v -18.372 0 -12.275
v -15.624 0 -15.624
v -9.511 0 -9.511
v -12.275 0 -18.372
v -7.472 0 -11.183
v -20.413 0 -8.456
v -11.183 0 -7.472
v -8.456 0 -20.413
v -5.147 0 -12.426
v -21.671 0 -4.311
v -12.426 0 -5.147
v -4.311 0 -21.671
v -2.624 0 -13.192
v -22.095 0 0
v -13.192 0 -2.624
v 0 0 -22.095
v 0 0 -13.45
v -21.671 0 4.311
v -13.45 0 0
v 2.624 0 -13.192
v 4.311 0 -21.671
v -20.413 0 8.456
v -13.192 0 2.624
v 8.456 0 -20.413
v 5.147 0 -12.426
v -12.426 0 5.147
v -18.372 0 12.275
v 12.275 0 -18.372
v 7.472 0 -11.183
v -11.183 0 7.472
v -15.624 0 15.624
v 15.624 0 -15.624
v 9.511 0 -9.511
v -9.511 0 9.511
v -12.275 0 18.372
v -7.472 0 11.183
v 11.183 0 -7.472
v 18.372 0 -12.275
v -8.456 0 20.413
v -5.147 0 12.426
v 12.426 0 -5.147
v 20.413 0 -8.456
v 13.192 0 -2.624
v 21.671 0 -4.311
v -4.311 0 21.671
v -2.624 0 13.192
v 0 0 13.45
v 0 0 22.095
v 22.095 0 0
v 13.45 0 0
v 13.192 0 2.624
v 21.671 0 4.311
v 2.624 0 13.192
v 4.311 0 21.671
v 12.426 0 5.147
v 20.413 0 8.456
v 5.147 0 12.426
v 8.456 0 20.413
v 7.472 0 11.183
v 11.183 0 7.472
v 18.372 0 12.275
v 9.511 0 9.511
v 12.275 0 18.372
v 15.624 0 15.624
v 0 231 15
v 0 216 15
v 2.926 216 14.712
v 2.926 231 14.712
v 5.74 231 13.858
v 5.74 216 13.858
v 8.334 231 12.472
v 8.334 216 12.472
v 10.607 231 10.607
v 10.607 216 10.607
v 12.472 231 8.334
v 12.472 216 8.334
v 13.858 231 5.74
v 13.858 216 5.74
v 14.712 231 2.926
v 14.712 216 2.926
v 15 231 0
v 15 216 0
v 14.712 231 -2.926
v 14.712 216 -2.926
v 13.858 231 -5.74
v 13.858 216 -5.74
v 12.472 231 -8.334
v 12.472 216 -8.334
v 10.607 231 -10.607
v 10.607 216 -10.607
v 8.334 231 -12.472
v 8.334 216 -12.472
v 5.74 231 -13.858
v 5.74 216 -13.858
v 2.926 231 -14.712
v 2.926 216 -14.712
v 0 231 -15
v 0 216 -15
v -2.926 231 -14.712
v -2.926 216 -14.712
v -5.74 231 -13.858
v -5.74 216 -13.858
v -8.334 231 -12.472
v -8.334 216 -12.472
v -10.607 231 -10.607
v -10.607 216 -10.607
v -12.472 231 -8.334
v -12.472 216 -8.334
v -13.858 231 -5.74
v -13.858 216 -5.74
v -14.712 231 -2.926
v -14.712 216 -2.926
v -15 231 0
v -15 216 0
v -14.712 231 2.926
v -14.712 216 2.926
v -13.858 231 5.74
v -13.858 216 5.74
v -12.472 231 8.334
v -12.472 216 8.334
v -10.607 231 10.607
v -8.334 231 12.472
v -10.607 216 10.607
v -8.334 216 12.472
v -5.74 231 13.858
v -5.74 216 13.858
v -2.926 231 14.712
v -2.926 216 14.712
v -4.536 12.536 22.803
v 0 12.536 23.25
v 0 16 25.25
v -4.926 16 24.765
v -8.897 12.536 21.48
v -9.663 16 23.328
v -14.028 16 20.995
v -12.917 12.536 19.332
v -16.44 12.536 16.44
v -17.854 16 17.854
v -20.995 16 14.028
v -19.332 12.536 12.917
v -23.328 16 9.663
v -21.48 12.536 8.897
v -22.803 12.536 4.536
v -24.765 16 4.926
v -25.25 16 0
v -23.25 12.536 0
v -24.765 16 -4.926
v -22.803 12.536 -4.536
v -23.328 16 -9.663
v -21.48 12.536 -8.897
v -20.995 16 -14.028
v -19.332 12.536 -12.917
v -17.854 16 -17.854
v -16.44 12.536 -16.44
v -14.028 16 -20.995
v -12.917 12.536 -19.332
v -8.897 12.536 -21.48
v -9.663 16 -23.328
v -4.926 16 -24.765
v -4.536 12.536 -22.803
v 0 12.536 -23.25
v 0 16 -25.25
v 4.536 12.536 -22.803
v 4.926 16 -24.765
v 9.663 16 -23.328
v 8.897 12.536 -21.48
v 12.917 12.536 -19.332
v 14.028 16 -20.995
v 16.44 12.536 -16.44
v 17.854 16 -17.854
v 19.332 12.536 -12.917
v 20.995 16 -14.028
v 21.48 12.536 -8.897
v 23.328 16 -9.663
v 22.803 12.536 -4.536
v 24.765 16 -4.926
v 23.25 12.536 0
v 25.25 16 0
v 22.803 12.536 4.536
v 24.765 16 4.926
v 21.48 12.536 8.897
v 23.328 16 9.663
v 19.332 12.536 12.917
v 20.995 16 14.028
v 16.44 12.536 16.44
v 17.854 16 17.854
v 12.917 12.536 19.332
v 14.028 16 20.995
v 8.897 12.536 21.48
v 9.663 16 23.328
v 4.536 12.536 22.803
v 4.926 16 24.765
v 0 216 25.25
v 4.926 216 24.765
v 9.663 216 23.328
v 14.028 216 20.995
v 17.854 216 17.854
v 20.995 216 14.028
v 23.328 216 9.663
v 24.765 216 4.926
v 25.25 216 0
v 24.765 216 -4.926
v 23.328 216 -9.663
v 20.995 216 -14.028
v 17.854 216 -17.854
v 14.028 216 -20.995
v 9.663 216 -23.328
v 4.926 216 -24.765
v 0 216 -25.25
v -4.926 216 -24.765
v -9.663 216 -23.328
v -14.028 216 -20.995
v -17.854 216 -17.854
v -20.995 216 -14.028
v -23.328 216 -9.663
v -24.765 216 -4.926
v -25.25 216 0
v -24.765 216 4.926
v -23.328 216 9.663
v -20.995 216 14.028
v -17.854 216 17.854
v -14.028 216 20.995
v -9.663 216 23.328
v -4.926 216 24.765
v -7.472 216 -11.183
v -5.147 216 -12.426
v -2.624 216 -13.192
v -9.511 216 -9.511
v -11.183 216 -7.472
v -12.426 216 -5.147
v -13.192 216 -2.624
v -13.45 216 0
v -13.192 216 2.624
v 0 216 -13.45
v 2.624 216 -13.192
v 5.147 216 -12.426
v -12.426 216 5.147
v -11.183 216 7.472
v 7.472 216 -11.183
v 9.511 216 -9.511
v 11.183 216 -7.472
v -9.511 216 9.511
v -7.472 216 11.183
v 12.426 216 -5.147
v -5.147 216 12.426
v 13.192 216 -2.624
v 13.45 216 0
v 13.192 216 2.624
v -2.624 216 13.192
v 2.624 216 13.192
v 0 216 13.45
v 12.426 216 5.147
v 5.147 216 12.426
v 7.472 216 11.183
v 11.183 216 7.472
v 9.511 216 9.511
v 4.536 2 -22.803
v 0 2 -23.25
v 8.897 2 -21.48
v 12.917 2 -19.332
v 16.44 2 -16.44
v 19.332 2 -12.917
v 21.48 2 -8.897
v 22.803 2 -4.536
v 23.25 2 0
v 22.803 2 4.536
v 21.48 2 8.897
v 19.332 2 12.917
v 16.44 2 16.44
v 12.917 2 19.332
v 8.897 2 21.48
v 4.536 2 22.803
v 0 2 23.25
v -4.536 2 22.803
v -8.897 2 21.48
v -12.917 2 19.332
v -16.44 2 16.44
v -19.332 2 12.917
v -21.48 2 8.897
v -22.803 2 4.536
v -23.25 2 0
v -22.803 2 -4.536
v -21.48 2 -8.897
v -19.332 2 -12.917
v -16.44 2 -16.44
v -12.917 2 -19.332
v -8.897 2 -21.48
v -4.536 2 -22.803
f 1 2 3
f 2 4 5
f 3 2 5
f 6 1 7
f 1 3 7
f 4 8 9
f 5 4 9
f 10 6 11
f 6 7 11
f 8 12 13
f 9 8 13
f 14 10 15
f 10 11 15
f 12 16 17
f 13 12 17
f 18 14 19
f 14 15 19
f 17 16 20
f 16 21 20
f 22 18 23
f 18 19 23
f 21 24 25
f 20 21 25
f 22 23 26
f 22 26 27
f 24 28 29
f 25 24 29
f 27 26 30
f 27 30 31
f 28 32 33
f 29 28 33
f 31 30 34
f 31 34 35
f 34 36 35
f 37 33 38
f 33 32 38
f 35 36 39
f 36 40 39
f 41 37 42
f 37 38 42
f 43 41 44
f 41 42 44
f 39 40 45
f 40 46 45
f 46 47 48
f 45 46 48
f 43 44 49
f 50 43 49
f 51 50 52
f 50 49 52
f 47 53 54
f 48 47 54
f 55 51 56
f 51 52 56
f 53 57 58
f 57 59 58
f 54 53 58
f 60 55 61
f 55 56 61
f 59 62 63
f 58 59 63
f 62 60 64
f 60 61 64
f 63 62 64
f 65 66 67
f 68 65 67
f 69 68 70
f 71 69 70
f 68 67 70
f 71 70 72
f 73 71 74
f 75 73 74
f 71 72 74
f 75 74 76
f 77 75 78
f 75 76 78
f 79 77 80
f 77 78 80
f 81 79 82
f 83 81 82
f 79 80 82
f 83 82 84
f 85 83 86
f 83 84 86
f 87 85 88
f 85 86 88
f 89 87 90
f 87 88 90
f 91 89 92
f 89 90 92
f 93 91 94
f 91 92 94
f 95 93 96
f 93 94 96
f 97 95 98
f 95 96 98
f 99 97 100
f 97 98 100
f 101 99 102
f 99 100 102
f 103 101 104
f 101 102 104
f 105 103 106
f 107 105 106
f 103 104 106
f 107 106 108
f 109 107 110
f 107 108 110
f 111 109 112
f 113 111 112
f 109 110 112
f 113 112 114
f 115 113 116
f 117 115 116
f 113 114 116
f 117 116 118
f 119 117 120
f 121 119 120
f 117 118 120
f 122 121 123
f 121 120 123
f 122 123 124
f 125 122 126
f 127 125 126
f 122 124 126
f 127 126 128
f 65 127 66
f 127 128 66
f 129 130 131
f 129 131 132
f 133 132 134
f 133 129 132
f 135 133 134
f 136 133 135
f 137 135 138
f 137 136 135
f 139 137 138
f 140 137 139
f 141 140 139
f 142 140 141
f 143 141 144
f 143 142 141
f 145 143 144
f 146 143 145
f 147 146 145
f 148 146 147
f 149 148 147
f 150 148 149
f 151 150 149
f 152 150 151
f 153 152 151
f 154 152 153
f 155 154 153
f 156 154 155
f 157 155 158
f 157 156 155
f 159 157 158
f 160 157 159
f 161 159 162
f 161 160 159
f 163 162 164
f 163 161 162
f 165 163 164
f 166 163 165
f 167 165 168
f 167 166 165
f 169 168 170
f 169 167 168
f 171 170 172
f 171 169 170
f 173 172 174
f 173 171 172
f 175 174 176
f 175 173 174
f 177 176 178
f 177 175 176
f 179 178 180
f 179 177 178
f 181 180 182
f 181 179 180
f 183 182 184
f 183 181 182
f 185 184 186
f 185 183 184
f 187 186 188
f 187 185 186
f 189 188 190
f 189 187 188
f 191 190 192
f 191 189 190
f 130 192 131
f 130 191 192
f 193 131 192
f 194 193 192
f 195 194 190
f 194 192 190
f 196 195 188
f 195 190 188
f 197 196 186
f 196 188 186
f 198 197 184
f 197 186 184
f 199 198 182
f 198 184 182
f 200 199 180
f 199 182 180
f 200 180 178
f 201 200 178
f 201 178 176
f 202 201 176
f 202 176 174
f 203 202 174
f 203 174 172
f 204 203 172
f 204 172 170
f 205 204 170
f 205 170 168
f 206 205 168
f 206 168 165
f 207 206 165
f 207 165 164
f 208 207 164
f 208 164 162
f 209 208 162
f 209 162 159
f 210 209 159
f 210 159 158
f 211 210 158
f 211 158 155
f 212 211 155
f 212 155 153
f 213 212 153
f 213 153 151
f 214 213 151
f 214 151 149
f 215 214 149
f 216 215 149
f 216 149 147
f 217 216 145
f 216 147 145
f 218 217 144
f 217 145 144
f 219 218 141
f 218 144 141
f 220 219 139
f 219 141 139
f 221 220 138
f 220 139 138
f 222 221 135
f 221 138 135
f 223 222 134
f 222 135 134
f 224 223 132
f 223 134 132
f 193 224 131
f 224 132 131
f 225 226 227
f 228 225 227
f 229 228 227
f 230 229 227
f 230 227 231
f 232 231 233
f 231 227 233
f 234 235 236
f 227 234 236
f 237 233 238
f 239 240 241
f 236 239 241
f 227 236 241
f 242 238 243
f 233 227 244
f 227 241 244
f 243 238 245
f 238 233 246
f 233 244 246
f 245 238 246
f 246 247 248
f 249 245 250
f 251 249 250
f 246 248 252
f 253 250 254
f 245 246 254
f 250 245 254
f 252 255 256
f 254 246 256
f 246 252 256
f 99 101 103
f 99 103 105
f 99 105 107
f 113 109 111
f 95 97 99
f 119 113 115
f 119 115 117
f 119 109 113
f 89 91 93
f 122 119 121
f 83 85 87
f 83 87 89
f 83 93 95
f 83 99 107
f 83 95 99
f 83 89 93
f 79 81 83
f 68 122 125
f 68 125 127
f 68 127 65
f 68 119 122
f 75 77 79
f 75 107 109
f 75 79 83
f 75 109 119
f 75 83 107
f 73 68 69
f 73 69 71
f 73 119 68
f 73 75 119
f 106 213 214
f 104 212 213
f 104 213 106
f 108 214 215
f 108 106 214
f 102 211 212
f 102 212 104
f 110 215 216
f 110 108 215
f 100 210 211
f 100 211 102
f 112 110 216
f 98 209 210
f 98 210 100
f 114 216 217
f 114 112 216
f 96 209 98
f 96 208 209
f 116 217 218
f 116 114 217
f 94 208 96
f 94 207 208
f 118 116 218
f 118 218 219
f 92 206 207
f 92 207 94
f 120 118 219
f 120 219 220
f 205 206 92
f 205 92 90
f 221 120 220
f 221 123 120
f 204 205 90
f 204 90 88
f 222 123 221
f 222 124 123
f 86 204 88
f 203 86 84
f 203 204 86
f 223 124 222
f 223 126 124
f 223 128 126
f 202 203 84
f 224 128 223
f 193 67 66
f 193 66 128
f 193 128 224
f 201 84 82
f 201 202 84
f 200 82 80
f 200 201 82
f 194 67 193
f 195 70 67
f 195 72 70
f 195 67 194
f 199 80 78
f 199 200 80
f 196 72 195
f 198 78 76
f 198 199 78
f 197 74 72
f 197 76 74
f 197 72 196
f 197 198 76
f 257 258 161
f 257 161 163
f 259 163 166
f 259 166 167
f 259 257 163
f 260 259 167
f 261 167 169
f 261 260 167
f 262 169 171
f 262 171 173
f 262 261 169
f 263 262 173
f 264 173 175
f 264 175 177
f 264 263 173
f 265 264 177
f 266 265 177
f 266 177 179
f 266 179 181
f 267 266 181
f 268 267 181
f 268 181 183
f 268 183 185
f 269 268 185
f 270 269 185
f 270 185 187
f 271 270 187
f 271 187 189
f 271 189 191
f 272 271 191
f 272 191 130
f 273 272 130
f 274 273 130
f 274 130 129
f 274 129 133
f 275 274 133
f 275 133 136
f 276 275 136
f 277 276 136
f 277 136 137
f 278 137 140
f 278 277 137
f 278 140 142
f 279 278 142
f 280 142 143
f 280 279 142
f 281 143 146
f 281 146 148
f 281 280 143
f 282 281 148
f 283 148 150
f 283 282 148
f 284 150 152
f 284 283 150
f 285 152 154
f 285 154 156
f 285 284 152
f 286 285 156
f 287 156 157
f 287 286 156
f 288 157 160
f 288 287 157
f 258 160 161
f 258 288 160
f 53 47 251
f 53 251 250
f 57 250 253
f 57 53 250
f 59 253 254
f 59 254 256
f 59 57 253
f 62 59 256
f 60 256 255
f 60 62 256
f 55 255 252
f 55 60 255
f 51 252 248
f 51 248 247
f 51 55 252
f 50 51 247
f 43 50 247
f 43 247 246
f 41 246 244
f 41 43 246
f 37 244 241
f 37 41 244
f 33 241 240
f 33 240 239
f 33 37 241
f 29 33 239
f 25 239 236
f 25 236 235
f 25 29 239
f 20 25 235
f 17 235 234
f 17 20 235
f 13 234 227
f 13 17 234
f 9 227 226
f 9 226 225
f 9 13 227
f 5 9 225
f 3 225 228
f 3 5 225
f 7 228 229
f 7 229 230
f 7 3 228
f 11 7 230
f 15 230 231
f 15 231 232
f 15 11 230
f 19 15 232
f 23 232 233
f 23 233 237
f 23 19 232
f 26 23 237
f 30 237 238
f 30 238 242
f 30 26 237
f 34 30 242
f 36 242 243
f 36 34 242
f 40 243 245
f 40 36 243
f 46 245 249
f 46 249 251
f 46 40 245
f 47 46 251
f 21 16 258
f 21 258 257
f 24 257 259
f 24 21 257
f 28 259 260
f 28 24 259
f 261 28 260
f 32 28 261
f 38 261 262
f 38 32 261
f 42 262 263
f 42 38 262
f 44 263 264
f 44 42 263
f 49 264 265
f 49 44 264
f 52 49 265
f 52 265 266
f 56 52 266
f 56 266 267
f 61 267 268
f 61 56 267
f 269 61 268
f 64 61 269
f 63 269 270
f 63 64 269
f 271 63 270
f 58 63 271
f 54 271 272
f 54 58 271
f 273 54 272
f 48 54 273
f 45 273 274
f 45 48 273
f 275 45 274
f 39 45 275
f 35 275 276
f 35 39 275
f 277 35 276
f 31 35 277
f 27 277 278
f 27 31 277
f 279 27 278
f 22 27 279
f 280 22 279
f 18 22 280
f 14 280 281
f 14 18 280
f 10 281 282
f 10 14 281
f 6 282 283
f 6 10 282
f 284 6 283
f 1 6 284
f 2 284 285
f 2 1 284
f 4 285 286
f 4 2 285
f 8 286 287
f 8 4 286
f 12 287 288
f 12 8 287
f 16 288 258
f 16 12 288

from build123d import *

# Parameters (mm, degrees)
SKETCH1_R           = 25.25
SKETCH1_R_2         = 13.45
BOSS_EXTRUDE1_DEPTH = 216
SKETCH2_OUTSIDE_W   = 98
SKETCH2_OUTSIDE_H   = 98
SKETCH2_OUTSIDE_R   = 23.25
CUT_EXTRUDE1_DEPTH  = 12
CHAMFER2_SIZE       = 4
CHAMFER2_SIZE_2     = 2.309401077
CHAMFER3_SIZE       = 2
CHAMFER3_SIZE2      = 1.154700538
SKETCH3_R           = 15
INSIDE_HEAD_DEPTH   = 15


with BuildPart() as part:
    # Sketch1 → Boss-Extrude1 (new body)
    with BuildSketch(Plane(origin=(0, 0, 0), x_dir=(1, 0, 0), z_dir=(0, 1, 0))):
        with Locations(Location((0, 0, 0), (0, 0, 270))):
            Circle(SKETCH1_R)
        with Locations(Location((0, 0, 0), (0, 0, 270))):
            Circle(SKETCH1_R_2, mode=Mode.SUBTRACT)
    extrude(amount=BOSS_EXTRUDE1_DEPTH)

    # Sketch2 outside → Cut-Extrude1 (cut)
    with BuildSketch(Plane.XZ):
        Rectangle(SKETCH2_OUTSIDE_W, SKETCH2_OUTSIDE_H)
        with Locations(Location((0, 0, 0), (0, 0, 270))):
            Circle(SKETCH2_OUTSIDE_R, mode=Mode.SUBTRACT)
    extrude(amount=-CUT_EXTRUDE1_DEPTH, mode=Mode.SUBTRACT)

    # Chamfer2
    # the kernel refuses this chamfer: 4, 2.309401077 mm, written as the material it takes off along each edge
    with BuildSketch(Plane(origin=(0, 12, 0), x_dir=(0, 0, 1), z_dir=(1, 0, 0))) as chamfer2_piece_1_section:
        Polygon((25.25, -CHAMFER2_SIZE), (25.25 - CHAMFER2_SIZE_2, 0), (25.25, 0), align=None)
    chamfer2_piece_1 = revolve(axis=Axis((0, 12, 0), (0, -1, 0)), mode=Mode.PRIVATE)
    chamfer2_piece_1 = chamfer2_piece_1 - Plane(origin=(0, 14.291094123, 0), x_dir=(0, 0, -1), z_dir=(0, -1, 0)) * Cylinder(23.25, 101, mode=Mode.PRIVATE)
    add(chamfer2_piece_1, mode=Mode.SUBTRACT)

    # Chamfer3
    chamfer3_edges = [part.edges().sort_by_distance(p)[0] for p in [
        (0, 0, 23.25),
    ]]
    chamfer3_side = [part.faces().sort_by_distance(p)[0] for p in [
        (0, 6.267949193, 23.25),
    ]]
    chamfer(chamfer3_edges, length=CHAMFER3_SIZE, length2=CHAMFER3_SIZE2, reference=chamfer3_side[0])

    # Sketch3 → inside_head (add)
    with BuildSketch(Plane(origin=(0, 216, 0), x_dir=(1, 0, 0), z_dir=(0, 1, 0))):
        with Locations(Location((0, 0, 0), (0, 0, 270))):
            Circle(SKETCH3_R)
    extrude(amount=INSIDE_HEAD_DEPTH)


solid = part.part
